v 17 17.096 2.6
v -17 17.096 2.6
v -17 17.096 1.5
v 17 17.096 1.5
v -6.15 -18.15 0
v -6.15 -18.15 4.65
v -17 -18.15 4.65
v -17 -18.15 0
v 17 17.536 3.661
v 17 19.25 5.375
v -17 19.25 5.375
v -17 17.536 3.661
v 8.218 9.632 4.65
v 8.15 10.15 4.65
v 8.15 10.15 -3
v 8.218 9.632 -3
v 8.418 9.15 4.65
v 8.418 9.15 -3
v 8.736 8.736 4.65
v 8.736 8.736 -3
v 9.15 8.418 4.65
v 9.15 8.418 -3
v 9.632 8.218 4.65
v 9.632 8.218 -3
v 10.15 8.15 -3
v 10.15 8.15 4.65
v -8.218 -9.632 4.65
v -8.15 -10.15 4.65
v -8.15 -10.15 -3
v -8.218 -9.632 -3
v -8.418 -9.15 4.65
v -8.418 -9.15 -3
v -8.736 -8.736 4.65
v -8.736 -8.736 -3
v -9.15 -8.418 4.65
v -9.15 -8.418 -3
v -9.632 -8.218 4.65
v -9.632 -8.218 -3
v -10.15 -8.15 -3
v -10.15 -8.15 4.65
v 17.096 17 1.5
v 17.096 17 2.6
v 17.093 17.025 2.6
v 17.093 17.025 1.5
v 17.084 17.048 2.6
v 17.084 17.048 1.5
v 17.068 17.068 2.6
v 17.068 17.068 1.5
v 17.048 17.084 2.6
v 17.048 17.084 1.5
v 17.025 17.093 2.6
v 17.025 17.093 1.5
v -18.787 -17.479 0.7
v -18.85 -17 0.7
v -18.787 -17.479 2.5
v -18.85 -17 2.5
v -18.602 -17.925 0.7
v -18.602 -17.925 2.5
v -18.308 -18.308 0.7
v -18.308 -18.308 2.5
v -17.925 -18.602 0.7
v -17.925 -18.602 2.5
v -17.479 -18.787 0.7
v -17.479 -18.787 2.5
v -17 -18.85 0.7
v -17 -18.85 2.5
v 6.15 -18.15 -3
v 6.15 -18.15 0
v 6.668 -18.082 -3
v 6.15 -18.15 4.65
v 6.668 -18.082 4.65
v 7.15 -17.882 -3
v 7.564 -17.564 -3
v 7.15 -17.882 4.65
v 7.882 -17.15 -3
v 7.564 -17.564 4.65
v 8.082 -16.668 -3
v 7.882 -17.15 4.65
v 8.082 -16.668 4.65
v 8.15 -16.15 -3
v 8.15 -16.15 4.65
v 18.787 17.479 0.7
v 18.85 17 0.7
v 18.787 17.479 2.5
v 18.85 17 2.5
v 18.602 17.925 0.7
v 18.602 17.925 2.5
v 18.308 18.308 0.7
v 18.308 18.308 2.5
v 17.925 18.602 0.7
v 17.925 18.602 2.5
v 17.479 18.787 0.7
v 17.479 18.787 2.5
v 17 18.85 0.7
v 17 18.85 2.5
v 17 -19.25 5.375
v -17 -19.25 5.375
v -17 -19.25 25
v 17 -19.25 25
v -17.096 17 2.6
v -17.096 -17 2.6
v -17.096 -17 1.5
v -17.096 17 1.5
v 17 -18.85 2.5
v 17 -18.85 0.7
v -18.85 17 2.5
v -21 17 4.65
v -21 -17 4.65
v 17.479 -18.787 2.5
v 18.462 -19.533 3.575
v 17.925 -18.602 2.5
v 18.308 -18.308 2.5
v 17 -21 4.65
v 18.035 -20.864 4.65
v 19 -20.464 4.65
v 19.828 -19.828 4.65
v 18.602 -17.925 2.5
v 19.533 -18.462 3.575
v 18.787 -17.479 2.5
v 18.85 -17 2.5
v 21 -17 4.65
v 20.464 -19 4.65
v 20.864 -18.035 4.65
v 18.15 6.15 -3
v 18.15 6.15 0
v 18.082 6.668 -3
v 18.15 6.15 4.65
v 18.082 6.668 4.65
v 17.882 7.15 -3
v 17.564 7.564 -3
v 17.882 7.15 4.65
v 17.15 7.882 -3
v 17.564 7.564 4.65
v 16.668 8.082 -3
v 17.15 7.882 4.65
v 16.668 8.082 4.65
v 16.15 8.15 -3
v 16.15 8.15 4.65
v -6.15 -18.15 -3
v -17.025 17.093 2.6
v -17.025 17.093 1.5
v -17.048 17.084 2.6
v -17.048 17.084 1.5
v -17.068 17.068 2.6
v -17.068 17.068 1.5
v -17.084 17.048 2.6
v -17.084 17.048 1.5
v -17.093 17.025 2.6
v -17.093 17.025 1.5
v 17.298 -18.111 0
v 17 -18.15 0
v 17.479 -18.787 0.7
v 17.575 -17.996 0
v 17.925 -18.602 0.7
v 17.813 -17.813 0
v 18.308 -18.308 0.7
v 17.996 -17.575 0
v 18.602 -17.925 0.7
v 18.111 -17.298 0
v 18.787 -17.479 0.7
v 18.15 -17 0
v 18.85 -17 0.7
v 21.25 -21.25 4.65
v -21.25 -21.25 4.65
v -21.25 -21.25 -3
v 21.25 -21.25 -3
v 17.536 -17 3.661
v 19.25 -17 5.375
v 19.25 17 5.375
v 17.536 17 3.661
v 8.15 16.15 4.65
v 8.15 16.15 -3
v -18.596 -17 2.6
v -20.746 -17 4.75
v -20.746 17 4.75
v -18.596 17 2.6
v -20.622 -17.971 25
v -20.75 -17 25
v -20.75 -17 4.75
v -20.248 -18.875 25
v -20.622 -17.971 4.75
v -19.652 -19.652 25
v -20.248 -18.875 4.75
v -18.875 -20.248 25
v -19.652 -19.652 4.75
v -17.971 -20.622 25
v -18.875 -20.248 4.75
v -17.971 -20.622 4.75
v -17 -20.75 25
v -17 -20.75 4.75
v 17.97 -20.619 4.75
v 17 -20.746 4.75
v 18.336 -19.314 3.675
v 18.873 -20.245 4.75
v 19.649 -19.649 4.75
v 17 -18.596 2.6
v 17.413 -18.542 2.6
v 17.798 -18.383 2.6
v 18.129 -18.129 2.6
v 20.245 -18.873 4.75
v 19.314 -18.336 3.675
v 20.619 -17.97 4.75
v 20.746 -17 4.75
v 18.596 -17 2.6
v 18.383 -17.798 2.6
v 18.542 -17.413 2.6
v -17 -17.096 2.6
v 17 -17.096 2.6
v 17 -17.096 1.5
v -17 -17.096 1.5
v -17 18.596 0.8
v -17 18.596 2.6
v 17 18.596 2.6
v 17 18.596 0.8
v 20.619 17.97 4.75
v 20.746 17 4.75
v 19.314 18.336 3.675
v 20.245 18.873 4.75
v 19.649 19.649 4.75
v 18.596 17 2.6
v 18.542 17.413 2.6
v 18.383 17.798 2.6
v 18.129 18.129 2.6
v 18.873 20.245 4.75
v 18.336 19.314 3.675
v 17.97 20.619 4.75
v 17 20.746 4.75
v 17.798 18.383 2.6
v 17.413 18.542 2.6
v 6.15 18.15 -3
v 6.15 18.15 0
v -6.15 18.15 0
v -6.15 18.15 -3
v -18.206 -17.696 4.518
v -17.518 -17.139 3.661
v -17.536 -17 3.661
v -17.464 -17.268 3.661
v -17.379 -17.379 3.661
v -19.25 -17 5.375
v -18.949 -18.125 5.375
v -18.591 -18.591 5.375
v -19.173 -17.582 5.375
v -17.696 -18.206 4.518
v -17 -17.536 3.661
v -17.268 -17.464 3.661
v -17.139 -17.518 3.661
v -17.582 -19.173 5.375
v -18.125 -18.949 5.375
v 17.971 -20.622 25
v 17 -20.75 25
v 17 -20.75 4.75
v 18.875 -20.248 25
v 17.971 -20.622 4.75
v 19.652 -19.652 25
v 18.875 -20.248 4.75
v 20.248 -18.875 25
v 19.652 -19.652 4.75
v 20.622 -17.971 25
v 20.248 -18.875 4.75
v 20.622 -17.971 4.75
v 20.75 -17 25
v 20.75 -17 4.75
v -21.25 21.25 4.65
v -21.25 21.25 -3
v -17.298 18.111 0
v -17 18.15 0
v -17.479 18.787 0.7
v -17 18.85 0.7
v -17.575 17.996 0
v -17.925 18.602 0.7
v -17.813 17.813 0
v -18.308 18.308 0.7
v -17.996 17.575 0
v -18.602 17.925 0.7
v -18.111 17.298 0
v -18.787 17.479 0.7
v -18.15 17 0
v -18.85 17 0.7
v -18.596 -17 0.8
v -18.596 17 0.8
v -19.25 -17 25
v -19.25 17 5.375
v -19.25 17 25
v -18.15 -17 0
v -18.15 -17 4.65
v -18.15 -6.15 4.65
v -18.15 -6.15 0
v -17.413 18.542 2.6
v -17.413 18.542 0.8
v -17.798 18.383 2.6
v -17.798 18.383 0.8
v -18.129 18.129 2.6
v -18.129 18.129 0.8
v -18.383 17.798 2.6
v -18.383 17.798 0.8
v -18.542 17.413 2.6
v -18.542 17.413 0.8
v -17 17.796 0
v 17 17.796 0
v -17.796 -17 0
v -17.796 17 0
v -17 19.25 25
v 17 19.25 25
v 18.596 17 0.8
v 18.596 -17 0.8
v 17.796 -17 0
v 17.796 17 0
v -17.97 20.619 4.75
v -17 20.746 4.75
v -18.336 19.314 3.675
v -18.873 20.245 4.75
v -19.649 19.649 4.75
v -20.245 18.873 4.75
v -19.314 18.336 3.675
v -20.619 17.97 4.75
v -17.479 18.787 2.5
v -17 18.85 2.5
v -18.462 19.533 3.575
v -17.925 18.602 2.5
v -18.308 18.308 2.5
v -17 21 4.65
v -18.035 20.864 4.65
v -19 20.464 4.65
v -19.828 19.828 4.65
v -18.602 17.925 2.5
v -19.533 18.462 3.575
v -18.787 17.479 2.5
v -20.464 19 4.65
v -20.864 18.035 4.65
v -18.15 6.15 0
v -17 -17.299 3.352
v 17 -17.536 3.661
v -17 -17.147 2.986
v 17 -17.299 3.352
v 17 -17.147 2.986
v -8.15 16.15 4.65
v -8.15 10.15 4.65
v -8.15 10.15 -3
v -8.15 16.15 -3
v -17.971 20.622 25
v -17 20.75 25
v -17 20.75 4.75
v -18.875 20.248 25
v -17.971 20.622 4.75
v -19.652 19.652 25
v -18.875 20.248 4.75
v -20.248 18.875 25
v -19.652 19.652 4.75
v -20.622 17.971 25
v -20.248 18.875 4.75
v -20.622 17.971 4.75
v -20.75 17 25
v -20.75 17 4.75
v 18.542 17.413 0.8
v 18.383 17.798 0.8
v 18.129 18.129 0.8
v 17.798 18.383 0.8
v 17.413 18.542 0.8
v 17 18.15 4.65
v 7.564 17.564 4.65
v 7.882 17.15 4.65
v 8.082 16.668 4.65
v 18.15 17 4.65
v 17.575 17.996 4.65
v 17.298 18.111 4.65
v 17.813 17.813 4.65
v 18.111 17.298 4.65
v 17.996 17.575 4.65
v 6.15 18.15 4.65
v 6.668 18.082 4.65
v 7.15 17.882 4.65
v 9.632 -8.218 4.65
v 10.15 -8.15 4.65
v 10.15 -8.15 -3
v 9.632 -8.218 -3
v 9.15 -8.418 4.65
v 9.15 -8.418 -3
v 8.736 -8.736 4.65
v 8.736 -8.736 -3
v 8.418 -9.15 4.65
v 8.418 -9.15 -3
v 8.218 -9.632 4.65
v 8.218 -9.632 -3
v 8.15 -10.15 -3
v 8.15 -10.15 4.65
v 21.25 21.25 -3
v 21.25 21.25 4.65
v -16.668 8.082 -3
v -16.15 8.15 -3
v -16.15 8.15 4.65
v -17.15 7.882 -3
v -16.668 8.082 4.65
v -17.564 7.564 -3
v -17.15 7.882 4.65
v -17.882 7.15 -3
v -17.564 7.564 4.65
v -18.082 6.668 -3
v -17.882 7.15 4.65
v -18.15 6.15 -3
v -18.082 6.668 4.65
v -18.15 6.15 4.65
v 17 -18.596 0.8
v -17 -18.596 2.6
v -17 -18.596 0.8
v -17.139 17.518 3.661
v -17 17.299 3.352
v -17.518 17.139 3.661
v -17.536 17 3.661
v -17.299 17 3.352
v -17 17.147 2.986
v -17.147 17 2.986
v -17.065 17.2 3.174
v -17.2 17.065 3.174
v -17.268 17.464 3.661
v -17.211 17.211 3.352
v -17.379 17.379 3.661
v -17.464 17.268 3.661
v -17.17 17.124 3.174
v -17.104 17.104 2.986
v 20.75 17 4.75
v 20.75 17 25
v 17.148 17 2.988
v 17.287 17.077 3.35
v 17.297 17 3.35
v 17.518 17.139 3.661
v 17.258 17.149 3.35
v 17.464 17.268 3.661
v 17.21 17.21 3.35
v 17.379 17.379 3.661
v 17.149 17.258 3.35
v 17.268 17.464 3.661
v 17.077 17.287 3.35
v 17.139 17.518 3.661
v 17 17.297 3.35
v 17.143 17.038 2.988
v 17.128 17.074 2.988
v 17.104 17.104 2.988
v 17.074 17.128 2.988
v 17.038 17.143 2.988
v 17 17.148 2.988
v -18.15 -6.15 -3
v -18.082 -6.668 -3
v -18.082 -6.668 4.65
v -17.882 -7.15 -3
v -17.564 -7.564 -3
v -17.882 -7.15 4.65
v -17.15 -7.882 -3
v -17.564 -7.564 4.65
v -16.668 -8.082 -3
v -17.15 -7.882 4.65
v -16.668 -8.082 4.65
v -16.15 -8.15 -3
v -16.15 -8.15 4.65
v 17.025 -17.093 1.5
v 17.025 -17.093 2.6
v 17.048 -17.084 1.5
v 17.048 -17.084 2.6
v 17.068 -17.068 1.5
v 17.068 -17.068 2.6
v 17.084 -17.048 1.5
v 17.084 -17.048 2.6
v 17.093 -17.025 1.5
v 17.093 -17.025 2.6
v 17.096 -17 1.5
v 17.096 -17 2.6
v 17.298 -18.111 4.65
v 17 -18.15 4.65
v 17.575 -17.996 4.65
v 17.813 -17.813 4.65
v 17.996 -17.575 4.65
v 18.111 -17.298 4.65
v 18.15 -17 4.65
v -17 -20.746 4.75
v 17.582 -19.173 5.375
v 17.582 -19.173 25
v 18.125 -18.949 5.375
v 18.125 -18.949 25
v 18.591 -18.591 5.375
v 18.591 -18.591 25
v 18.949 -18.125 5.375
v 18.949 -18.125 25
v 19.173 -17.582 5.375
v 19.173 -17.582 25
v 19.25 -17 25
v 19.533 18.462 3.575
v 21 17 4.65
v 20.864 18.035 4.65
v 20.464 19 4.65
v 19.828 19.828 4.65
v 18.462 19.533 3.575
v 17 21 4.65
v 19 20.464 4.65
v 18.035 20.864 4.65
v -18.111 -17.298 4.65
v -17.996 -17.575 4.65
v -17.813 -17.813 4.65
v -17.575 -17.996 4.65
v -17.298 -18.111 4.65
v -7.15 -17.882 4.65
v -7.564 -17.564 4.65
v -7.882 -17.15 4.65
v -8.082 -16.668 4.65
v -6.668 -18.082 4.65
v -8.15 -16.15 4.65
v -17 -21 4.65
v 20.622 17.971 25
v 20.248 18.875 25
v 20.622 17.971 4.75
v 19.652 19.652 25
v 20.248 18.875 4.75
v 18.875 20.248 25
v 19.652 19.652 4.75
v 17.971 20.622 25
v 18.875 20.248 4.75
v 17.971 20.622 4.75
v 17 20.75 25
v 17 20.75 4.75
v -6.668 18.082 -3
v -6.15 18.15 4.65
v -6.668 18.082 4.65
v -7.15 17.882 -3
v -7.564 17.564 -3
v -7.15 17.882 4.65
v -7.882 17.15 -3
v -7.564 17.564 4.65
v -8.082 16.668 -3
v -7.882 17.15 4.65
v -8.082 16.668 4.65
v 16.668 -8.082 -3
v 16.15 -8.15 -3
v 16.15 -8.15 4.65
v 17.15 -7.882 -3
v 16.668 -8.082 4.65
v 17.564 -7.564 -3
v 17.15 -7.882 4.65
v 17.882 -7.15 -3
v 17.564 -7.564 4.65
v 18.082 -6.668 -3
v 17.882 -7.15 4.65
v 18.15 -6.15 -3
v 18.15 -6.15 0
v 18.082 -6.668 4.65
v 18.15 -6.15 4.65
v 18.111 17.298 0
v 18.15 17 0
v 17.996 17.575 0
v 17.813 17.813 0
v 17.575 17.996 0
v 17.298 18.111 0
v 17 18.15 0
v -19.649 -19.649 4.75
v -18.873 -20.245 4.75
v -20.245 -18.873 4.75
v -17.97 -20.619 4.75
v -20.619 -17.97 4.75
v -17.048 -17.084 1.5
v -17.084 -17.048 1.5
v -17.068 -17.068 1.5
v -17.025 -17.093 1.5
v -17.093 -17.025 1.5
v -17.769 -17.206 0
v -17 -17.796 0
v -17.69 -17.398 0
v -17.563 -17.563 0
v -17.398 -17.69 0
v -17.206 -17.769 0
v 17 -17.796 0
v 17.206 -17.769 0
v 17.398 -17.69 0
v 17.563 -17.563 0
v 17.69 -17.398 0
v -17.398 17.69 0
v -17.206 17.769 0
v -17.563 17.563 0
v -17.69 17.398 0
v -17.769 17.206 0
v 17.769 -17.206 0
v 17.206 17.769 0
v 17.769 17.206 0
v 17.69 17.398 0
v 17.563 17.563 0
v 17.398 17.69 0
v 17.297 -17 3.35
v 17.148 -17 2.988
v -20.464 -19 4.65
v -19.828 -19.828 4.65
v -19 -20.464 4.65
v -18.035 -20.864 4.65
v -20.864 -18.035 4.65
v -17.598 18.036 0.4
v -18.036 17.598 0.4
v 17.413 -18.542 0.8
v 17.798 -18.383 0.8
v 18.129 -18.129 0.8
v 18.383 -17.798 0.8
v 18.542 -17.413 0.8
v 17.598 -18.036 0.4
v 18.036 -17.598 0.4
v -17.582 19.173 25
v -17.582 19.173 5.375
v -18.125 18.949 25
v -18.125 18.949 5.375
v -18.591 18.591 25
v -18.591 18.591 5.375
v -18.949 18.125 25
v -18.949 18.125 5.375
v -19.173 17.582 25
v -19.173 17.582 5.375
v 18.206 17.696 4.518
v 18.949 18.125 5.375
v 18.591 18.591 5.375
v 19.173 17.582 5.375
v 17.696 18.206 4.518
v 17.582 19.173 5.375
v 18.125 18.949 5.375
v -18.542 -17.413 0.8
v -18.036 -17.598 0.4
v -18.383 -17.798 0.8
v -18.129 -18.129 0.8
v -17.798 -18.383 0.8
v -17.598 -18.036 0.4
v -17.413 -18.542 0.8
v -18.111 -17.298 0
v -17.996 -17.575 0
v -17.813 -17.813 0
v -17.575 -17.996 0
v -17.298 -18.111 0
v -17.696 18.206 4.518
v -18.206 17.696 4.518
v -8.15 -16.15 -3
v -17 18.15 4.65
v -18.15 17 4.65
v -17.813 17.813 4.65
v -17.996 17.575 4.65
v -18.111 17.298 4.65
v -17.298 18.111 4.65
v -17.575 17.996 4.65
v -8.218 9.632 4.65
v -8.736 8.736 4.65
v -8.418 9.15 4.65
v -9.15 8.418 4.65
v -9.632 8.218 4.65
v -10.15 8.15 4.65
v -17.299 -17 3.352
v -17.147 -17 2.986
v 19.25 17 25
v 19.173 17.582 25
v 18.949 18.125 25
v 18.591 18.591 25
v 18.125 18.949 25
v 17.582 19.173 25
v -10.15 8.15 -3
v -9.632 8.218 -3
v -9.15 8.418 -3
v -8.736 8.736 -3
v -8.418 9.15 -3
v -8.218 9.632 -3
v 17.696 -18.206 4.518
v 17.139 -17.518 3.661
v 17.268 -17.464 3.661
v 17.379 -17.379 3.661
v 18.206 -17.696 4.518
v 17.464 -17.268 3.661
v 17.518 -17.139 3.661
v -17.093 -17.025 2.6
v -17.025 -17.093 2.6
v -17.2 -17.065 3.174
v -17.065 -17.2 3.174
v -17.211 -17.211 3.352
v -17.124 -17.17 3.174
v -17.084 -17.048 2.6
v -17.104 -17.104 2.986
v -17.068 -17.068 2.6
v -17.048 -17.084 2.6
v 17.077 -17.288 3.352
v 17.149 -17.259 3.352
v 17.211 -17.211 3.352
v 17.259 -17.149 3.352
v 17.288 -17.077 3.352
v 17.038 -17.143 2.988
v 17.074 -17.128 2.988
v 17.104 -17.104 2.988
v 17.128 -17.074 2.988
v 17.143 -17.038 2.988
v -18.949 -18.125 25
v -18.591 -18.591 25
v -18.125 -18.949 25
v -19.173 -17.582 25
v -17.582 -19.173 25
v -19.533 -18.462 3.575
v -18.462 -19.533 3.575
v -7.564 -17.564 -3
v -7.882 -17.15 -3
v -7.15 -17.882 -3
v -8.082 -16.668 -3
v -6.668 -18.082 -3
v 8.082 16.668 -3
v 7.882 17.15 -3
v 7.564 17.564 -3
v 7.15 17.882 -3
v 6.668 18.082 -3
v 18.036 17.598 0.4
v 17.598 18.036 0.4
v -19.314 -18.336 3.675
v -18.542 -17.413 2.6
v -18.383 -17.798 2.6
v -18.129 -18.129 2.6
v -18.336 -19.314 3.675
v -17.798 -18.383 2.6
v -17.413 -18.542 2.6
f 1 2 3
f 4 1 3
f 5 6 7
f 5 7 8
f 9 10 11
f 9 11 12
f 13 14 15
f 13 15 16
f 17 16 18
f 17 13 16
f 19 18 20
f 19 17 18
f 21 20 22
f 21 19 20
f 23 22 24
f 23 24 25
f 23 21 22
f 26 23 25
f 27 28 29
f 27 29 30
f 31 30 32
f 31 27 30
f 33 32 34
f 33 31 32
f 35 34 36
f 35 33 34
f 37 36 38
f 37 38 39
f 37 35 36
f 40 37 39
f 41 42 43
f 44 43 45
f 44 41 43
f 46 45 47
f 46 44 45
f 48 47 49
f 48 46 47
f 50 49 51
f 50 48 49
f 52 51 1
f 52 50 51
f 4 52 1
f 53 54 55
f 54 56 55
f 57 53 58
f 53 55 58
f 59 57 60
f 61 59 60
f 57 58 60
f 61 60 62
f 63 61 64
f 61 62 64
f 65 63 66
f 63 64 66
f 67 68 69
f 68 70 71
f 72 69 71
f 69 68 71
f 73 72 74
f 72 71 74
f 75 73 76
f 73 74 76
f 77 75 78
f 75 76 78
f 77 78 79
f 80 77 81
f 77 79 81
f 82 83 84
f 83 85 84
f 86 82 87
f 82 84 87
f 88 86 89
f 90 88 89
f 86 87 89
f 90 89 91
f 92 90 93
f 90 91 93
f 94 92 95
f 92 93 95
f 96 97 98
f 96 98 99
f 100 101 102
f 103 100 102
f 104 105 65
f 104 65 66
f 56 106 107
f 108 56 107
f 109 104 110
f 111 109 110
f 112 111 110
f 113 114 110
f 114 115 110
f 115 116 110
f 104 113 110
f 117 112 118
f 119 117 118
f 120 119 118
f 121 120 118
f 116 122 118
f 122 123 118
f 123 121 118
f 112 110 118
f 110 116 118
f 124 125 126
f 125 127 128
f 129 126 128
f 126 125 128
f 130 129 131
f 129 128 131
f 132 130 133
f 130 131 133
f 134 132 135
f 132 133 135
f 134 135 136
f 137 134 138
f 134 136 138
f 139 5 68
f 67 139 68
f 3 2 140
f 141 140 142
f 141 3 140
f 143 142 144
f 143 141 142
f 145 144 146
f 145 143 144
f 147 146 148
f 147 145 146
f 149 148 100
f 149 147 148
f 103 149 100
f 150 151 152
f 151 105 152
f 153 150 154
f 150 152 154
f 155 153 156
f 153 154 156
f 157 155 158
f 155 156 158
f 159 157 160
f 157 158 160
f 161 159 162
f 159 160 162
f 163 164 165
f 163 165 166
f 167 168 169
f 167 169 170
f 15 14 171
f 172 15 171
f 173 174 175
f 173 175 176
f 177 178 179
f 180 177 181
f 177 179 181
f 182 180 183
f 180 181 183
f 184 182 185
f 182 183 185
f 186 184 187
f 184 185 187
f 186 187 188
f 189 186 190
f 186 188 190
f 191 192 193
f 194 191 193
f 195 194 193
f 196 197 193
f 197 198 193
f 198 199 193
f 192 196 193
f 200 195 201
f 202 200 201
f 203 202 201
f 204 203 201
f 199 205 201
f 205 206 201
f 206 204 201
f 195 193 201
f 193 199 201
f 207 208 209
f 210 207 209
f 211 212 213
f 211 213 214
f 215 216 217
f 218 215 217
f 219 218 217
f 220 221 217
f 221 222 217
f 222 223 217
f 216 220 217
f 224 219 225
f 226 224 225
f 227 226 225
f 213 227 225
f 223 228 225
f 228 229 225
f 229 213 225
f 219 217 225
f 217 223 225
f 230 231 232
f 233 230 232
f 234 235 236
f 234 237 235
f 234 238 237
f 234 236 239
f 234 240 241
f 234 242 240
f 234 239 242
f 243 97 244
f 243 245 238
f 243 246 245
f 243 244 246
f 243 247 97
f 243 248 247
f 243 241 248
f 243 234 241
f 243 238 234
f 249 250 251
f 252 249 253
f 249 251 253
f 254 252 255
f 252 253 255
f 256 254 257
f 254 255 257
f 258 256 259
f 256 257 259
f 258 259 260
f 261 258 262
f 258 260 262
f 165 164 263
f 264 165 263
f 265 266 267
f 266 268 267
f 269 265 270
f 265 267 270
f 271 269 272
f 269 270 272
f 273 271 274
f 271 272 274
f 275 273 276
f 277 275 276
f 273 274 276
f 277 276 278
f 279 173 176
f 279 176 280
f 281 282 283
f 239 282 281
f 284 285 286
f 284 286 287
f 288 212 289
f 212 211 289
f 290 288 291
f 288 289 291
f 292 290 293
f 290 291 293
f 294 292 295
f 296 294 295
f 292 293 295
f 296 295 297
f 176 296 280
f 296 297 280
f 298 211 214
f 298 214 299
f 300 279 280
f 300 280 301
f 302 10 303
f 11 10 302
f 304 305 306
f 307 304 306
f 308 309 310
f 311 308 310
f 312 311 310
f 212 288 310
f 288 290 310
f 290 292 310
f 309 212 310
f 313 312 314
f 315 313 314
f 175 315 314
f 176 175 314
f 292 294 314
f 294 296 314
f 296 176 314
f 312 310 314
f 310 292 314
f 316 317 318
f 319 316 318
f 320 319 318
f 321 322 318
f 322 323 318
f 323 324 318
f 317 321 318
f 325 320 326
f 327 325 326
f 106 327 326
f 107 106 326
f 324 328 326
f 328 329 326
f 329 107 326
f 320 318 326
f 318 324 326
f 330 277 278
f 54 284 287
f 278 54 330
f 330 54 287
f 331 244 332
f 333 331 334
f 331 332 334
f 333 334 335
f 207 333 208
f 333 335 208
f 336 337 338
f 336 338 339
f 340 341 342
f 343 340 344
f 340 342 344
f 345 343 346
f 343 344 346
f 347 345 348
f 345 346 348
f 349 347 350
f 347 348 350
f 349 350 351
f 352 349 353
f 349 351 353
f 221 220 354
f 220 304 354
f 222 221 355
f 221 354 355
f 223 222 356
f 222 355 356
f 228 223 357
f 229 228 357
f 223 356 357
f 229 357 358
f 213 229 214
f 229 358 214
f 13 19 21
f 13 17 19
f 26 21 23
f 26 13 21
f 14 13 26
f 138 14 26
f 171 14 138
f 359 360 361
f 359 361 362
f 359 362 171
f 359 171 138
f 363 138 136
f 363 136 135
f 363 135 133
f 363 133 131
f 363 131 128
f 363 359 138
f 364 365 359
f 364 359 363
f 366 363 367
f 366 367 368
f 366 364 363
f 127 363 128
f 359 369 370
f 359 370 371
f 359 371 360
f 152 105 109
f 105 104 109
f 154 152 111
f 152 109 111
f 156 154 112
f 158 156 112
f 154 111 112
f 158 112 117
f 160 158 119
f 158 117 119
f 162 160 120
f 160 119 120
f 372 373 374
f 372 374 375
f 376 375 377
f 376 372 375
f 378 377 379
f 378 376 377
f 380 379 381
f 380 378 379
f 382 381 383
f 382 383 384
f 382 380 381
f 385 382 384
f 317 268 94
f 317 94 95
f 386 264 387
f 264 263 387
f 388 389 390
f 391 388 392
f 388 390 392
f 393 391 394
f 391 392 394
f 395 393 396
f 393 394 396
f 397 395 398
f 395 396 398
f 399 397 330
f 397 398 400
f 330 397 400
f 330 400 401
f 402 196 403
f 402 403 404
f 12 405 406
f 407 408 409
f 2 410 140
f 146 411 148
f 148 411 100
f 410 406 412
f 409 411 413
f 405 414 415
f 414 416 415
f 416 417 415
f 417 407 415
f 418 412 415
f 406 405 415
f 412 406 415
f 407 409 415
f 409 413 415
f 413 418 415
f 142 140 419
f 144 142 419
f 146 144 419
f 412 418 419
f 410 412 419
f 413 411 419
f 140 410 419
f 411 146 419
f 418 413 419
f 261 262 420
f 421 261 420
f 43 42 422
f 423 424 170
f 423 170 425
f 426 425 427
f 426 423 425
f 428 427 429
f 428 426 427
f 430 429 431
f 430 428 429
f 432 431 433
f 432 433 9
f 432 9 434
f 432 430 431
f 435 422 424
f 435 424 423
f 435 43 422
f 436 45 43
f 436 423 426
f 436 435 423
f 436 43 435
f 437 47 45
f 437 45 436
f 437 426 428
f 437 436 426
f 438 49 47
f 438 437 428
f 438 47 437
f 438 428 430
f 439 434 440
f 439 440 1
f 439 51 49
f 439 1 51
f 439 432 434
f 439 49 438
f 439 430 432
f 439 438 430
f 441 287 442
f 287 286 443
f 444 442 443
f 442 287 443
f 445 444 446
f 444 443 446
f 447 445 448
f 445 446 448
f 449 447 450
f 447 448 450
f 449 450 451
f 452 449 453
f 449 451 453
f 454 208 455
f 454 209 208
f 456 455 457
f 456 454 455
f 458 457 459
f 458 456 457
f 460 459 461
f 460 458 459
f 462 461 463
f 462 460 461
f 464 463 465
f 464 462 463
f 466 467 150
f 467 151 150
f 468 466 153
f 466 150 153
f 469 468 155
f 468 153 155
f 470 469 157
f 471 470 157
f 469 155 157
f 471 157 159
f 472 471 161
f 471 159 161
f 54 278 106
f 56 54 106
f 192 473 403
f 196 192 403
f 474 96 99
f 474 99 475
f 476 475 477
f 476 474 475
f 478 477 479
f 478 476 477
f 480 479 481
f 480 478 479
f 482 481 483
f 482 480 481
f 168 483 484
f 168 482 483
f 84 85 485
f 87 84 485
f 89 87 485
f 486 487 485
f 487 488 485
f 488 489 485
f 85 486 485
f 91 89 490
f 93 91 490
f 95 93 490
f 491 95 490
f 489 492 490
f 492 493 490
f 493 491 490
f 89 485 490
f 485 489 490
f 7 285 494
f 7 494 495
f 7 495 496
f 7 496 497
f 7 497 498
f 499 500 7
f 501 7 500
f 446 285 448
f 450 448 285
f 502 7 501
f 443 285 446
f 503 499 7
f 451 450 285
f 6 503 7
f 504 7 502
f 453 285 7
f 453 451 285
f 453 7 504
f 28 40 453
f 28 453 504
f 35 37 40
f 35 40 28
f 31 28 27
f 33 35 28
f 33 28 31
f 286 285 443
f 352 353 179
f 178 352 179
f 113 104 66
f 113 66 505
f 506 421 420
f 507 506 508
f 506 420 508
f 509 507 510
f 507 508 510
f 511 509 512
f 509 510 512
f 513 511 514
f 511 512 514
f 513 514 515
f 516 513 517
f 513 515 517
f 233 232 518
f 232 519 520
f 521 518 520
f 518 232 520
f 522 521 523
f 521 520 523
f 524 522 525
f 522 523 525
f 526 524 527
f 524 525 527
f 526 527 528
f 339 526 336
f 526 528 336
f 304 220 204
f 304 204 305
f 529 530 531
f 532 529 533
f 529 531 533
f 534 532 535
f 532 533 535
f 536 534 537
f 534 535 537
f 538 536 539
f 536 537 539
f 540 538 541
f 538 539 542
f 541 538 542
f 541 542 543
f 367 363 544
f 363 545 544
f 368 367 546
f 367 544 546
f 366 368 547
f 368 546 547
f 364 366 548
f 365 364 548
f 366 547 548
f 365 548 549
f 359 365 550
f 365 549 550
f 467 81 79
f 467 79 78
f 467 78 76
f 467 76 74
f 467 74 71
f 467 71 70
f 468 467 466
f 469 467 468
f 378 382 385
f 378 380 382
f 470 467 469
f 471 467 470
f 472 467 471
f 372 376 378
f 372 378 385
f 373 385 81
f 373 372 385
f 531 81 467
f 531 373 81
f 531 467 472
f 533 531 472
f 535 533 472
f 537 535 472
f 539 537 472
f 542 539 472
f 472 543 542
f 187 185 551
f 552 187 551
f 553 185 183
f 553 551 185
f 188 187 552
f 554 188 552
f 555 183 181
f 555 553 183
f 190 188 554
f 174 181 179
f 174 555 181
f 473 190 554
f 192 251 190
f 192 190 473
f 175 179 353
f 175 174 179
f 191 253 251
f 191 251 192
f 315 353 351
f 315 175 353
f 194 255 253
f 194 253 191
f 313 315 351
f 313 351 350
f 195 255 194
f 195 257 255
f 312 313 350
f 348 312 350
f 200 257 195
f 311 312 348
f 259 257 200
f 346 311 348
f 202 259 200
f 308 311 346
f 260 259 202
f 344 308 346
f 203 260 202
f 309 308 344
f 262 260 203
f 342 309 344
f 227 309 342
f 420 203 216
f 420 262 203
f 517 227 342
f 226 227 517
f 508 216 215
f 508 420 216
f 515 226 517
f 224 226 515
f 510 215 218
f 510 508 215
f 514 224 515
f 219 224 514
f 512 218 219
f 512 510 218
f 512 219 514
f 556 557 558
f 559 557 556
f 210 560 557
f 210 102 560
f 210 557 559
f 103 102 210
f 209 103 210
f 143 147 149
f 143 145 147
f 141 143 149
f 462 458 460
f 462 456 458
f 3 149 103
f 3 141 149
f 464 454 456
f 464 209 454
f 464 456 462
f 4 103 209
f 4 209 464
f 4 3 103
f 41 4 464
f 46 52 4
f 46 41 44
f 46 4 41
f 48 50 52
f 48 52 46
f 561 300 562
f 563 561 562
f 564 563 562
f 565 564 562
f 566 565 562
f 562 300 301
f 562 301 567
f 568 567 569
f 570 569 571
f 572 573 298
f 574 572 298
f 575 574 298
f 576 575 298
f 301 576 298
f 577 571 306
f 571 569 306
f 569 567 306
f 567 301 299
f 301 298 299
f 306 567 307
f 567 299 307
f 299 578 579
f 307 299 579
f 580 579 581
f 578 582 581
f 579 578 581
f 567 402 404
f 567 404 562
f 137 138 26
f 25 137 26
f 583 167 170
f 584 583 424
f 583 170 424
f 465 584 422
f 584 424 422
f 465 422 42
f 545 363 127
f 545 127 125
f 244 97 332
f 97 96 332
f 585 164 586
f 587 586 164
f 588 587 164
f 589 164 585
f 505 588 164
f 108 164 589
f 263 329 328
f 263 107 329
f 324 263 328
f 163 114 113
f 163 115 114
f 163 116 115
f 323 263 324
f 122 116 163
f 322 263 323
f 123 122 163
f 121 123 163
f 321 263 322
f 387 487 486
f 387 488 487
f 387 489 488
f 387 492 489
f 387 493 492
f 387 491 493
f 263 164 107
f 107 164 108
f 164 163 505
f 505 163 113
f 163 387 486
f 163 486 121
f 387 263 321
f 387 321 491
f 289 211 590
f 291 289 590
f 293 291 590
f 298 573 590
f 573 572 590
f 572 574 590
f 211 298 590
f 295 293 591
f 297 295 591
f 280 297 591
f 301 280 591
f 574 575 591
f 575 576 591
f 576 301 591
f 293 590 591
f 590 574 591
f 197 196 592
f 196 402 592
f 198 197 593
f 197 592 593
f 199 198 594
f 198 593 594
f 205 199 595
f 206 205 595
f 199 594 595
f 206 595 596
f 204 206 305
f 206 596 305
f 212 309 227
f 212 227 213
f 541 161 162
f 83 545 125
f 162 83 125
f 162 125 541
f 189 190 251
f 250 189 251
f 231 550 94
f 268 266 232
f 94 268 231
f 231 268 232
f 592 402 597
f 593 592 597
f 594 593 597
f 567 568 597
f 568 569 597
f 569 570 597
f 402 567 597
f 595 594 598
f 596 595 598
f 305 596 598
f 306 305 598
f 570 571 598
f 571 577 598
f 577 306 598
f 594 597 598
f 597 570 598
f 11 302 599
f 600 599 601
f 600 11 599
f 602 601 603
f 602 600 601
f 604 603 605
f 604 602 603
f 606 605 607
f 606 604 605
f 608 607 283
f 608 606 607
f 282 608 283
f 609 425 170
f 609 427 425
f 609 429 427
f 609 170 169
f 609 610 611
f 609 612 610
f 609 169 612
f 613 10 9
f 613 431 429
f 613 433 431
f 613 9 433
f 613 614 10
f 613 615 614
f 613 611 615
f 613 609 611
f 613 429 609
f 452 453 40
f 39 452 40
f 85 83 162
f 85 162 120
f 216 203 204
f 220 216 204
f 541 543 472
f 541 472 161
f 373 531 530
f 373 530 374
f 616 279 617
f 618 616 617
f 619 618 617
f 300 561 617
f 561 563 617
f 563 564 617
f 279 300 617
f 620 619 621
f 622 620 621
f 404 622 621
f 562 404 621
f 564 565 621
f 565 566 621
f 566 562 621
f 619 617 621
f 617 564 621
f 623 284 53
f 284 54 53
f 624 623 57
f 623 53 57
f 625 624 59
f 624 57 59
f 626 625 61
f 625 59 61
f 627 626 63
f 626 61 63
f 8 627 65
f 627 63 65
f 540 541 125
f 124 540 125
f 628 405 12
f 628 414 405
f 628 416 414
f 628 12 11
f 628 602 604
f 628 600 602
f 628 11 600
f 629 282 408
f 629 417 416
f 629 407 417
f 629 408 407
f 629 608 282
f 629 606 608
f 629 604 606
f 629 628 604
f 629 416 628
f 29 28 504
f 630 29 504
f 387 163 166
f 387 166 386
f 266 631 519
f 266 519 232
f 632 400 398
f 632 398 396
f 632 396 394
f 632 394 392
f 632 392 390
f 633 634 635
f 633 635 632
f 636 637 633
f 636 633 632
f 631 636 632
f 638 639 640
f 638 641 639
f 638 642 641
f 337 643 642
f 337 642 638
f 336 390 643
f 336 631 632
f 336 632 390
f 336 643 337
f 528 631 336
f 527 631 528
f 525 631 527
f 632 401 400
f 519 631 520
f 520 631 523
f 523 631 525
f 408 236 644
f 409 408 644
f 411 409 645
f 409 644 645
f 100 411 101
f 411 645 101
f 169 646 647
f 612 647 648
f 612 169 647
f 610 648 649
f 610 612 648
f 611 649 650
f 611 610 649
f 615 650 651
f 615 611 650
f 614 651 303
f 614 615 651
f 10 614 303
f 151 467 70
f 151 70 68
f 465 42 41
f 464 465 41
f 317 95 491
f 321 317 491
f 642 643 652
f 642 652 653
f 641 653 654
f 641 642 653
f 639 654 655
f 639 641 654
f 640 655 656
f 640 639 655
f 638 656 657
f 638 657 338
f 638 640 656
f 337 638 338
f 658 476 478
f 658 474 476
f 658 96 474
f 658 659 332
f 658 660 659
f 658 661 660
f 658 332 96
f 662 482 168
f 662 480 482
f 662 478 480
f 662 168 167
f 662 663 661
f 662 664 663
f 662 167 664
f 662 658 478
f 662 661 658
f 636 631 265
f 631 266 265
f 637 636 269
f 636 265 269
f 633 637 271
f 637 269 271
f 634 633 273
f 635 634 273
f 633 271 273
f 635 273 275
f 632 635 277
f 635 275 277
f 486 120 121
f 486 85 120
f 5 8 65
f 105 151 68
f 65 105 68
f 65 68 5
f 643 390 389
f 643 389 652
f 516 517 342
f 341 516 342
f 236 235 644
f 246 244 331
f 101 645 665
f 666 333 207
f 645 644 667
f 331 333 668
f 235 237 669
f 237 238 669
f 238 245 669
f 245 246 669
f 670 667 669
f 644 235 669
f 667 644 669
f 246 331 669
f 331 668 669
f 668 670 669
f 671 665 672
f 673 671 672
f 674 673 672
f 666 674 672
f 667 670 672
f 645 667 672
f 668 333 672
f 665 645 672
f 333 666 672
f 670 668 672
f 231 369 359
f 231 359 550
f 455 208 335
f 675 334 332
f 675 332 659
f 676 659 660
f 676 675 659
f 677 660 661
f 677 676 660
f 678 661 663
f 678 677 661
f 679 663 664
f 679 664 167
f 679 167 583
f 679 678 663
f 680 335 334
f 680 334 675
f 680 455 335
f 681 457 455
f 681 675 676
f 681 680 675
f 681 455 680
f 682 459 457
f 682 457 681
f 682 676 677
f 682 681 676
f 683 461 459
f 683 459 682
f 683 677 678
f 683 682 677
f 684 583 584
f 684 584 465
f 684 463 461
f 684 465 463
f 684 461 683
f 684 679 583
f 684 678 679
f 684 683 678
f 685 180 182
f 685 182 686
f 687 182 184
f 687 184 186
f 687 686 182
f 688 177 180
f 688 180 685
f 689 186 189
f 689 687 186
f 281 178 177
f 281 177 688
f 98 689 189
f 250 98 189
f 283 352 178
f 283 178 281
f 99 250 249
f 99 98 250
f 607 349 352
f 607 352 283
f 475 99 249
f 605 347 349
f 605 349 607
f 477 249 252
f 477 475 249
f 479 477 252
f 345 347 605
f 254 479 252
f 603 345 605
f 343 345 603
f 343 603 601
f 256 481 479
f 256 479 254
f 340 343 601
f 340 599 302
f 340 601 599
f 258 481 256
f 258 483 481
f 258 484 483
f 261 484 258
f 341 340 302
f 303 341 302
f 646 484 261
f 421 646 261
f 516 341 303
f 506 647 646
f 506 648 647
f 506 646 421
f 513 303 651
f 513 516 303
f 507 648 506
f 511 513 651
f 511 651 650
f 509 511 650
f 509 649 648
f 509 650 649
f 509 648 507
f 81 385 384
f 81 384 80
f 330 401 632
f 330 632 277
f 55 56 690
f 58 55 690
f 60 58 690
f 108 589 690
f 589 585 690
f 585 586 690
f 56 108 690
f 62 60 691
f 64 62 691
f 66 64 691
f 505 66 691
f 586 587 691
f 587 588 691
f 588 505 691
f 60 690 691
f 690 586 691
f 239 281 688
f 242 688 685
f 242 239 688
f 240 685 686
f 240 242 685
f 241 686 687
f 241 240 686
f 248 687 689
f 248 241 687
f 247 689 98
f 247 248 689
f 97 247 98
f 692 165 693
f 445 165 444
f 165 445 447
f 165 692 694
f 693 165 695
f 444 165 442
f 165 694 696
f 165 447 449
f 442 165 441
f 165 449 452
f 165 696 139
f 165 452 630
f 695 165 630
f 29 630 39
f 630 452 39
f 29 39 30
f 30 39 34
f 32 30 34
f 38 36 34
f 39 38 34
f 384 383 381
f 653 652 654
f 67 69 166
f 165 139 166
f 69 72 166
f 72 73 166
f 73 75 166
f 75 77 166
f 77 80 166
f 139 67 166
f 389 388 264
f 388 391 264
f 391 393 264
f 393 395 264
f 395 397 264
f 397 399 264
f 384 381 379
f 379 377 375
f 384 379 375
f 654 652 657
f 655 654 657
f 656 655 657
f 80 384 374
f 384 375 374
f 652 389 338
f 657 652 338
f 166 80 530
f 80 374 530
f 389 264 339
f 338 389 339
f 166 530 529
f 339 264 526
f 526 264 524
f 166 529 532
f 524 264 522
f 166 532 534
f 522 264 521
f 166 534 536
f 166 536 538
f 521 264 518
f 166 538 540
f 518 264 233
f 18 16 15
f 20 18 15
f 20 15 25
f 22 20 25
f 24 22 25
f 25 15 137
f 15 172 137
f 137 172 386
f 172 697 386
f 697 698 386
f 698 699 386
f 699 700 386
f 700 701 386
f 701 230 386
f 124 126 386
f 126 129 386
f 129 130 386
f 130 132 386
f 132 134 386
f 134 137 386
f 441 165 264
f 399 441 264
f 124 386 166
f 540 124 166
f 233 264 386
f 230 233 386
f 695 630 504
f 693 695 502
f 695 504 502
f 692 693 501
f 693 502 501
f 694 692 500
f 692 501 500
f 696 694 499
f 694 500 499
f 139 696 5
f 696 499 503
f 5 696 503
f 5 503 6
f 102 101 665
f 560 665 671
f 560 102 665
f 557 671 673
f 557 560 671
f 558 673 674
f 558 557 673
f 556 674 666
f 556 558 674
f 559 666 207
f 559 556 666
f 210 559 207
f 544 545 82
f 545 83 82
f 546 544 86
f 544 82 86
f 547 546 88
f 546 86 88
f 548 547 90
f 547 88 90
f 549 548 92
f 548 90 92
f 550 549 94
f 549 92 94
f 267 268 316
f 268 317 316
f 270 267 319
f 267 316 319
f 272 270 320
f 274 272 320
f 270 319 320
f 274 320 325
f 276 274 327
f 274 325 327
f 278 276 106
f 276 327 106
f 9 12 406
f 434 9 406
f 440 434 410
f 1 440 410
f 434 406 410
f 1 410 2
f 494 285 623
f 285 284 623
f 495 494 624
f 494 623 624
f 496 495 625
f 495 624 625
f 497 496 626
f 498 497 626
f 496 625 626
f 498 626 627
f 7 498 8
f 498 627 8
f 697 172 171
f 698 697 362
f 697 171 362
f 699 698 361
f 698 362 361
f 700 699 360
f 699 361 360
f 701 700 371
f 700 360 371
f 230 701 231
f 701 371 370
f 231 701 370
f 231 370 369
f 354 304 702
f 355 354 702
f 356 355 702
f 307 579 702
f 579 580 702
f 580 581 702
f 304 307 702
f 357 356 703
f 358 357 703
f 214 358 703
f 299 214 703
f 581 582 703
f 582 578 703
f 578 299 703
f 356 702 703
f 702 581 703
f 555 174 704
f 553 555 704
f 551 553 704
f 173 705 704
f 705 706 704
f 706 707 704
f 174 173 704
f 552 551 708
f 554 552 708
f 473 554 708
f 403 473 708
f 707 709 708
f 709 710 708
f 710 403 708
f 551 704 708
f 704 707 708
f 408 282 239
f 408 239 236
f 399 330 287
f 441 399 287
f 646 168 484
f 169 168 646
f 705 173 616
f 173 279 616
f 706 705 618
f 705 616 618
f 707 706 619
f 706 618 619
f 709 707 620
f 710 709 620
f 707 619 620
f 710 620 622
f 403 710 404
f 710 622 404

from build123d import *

# Parameters (mm, degrees)
SKETCH002_W       = 42.5
SKETCH002_H       = 42.5
PAD_DEPTH         = 4.65
PAD_DEPTH_BACK    = 3
POCKET_DEPTH      = 124.178927
POCKET_DEPTH_BACK = 125.828927
PAD001_DEPTH      = 25
THICKNESS_T       = -1.5


with BuildPart() as body:
    # Sketch002 → Pad (new body, two sides)
    with BuildSketch(Plane.XY) as pad_sk:
        Rectangle(SKETCH002_W, SKETCH002_H)
    extrude(amount=PAD_DEPTH)
    extrude(pad_sk.sketch, amount=-PAD_DEPTH_BACK)

    # Sketch003 → Pocket (cut, two sides)
    with BuildSketch(Plane.XY) as pocket_sk:
        with BuildLine():
            Line((16.15, -8.15), (10.15, -8.15))
            ThreePointArc((10.15, -8.15), (8.735786, -8.735786), (8.15, -10.15))
            Line((8.15, -10.15), (8.15, -16.15))
            ThreePointArc((6.15, -18.15), (7.564214, -17.564214), (8.15, -16.15))
            Line((6.15, -18.15), (0, -18.15))
            Line((-6.15, -18.15), (0, -18.15))
            ThreePointArc((-8.15, -16.15), (-7.564214, -17.564214), (-6.15, -18.15))
            Line((-8.15, -10.15), (-8.15, -16.15))
            ThreePointArc((-8.15, -10.15), (-8.735786, -8.735786), (-10.15, -8.15))
            Line((-16.15, -8.15), (-10.15, -8.15))
            ThreePointArc((-18.15, -6.15), (-17.564214, -7.564214), (-16.15, -8.15))
            Line((-18.15, 0), (-18.15, -6.15))
            Line((-18.15, 0), (-18.15, 6.15))
            ThreePointArc((-16.15, 8.15), (-17.564214, 7.564214), (-18.15, 6.15))
            Line((-16.15, 8.15), (-10.15, 8.15))
            ThreePointArc((-10.15, 8.15), (-8.735786, 8.735786), (-8.15, 10.15))
            Line((-8.15, 10.15), (-8.15, 16.15))
            ThreePointArc((-6.15, 18.15), (-7.564214, 17.564214), (-8.15, 16.15))
            Line((-6.15, 18.15), (0, 18.15))
            Line((6.15, 18.15), (0, 18.15))
            ThreePointArc((8.15, 16.15), (7.564214, 17.564214), (6.15, 18.15))
            Line((8.15, 10.15), (8.15, 16.15))
            ThreePointArc((8.15, 10.15), (8.735786, 8.735786), (10.15, 8.15))
            Line((16.15, 8.15), (10.15, 8.15))
            ThreePointArc((18.15, 6.15), (17.564214, 7.564214), (16.15, 8.15))
            Line((18.15, 0), (18.15, 6.15))
            Line((18.15, 0), (18.15, -6.15))
            ThreePointArc((16.15, -8.15), (17.564214, -7.564214), (18.15, -6.15))
        make_face()
    extrude(amount=-POCKET_DEPTH, mode=Mode.SUBTRACT)
    extrude(pocket_sk.sketch, amount=POCKET_DEPTH_BACK, mode=Mode.SUBTRACT)

    # SubtractivePipe: sweep along a path in Sketch
    with BuildLine(Plane.XY) as subtractivepipe_path:
        Line((-17, -21), (17, -21))
        ThreePointArc((17, -21), (19.828427, -19.828427), (21, -17))
        Line((21, -17), (21, 17))
        ThreePointArc((21, 17), (19.828427, 19.828427), (17, 21))
        Line((17, 21), (-17, 21))
        ThreePointArc((-17, 21), (-19.828427, 19.828427), (-21, 17))
        Line((-21, 17), (-21, -17))
        ThreePointArc((-21, -17), (-19.828427, -19.828427), (-17, -21))
    # Sketch001 → SubtractivePipe (sweep, cut)
    with BuildSketch(Plane.XZ):
        Polygon((18.15, 4.65), (21, 4.65), (18.85, 2.5), (18.85, 0.7), (18.15, 0), align=None)
    sweep(path=subtractivepipe_path.line, mode=Mode.SUBTRACT)


with BuildPart() as body001:
    # Sketch005 → Pad001 (new body)
    with BuildSketch(Plane.XY):
        with BuildLine():
            Line((-17, -20.75), (17, -20.75))
            ThreePointArc((17, -20.75), (19.65165, -19.65165), (20.75, -17))
            Line((20.75, -17), (20.75, 17))
            ThreePointArc((20.75, 17), (19.65165, 19.65165), (17, 20.75))
            Line((17, 20.75), (-17, 20.75))
            ThreePointArc((-17, 20.75), (-19.65165, 19.65165), (-20.75, 17))
            Line((-20.75, 17), (-20.75, -17))
            ThreePointArc((-20.75, -17), (-19.65165, -19.65165), (-17, -20.75))
        make_face()
    extrude(amount=PAD001_DEPTH)

    # SubtractivePipe001: sweep along a path in Sketch005
    with BuildLine(Plane.XY) as subtractivepipe001_path:
        Line((-17, -20.75), (17, -20.75))
        ThreePointArc((17, -20.75), (19.65165, -19.65165), (20.75, -17))
        Line((20.75, -17), (20.75, 17))
        ThreePointArc((20.75, 17), (19.65165, 19.65165), (17, 20.75))
        Line((17, 20.75), (-17, 20.75))
        ThreePointArc((-17, 20.75), (-19.65165, 19.65165), (-20.75, 17))
        Line((-20.75, 17), (-20.75, -17))
        ThreePointArc((-20.75, -17), (-19.65165, -19.65165), (-17, -20.75))
    # Sketch006 → SubtractivePipe001 (sweep, cut)
    with BuildSketch(Plane.XZ):
        Polygon((20.746447, 4.75), (18.596447, 2.6), (18.596447, 0.8), (17.796447, 0), (21.279516, 0), (21.279516, 4.75), align=None)
    sweep(path=subtractivepipe001_path.line, mode=Mode.SUBTRACT)

    # Thickness
    thickness_openings = [body001.faces().sort_by_distance(p)[0] for p in [
        (0, 0, 25),
    ]]
    offset(amount=THICKNESS_T, openings=thickness_openings)


solid = Compound([body.part, body001.part])
